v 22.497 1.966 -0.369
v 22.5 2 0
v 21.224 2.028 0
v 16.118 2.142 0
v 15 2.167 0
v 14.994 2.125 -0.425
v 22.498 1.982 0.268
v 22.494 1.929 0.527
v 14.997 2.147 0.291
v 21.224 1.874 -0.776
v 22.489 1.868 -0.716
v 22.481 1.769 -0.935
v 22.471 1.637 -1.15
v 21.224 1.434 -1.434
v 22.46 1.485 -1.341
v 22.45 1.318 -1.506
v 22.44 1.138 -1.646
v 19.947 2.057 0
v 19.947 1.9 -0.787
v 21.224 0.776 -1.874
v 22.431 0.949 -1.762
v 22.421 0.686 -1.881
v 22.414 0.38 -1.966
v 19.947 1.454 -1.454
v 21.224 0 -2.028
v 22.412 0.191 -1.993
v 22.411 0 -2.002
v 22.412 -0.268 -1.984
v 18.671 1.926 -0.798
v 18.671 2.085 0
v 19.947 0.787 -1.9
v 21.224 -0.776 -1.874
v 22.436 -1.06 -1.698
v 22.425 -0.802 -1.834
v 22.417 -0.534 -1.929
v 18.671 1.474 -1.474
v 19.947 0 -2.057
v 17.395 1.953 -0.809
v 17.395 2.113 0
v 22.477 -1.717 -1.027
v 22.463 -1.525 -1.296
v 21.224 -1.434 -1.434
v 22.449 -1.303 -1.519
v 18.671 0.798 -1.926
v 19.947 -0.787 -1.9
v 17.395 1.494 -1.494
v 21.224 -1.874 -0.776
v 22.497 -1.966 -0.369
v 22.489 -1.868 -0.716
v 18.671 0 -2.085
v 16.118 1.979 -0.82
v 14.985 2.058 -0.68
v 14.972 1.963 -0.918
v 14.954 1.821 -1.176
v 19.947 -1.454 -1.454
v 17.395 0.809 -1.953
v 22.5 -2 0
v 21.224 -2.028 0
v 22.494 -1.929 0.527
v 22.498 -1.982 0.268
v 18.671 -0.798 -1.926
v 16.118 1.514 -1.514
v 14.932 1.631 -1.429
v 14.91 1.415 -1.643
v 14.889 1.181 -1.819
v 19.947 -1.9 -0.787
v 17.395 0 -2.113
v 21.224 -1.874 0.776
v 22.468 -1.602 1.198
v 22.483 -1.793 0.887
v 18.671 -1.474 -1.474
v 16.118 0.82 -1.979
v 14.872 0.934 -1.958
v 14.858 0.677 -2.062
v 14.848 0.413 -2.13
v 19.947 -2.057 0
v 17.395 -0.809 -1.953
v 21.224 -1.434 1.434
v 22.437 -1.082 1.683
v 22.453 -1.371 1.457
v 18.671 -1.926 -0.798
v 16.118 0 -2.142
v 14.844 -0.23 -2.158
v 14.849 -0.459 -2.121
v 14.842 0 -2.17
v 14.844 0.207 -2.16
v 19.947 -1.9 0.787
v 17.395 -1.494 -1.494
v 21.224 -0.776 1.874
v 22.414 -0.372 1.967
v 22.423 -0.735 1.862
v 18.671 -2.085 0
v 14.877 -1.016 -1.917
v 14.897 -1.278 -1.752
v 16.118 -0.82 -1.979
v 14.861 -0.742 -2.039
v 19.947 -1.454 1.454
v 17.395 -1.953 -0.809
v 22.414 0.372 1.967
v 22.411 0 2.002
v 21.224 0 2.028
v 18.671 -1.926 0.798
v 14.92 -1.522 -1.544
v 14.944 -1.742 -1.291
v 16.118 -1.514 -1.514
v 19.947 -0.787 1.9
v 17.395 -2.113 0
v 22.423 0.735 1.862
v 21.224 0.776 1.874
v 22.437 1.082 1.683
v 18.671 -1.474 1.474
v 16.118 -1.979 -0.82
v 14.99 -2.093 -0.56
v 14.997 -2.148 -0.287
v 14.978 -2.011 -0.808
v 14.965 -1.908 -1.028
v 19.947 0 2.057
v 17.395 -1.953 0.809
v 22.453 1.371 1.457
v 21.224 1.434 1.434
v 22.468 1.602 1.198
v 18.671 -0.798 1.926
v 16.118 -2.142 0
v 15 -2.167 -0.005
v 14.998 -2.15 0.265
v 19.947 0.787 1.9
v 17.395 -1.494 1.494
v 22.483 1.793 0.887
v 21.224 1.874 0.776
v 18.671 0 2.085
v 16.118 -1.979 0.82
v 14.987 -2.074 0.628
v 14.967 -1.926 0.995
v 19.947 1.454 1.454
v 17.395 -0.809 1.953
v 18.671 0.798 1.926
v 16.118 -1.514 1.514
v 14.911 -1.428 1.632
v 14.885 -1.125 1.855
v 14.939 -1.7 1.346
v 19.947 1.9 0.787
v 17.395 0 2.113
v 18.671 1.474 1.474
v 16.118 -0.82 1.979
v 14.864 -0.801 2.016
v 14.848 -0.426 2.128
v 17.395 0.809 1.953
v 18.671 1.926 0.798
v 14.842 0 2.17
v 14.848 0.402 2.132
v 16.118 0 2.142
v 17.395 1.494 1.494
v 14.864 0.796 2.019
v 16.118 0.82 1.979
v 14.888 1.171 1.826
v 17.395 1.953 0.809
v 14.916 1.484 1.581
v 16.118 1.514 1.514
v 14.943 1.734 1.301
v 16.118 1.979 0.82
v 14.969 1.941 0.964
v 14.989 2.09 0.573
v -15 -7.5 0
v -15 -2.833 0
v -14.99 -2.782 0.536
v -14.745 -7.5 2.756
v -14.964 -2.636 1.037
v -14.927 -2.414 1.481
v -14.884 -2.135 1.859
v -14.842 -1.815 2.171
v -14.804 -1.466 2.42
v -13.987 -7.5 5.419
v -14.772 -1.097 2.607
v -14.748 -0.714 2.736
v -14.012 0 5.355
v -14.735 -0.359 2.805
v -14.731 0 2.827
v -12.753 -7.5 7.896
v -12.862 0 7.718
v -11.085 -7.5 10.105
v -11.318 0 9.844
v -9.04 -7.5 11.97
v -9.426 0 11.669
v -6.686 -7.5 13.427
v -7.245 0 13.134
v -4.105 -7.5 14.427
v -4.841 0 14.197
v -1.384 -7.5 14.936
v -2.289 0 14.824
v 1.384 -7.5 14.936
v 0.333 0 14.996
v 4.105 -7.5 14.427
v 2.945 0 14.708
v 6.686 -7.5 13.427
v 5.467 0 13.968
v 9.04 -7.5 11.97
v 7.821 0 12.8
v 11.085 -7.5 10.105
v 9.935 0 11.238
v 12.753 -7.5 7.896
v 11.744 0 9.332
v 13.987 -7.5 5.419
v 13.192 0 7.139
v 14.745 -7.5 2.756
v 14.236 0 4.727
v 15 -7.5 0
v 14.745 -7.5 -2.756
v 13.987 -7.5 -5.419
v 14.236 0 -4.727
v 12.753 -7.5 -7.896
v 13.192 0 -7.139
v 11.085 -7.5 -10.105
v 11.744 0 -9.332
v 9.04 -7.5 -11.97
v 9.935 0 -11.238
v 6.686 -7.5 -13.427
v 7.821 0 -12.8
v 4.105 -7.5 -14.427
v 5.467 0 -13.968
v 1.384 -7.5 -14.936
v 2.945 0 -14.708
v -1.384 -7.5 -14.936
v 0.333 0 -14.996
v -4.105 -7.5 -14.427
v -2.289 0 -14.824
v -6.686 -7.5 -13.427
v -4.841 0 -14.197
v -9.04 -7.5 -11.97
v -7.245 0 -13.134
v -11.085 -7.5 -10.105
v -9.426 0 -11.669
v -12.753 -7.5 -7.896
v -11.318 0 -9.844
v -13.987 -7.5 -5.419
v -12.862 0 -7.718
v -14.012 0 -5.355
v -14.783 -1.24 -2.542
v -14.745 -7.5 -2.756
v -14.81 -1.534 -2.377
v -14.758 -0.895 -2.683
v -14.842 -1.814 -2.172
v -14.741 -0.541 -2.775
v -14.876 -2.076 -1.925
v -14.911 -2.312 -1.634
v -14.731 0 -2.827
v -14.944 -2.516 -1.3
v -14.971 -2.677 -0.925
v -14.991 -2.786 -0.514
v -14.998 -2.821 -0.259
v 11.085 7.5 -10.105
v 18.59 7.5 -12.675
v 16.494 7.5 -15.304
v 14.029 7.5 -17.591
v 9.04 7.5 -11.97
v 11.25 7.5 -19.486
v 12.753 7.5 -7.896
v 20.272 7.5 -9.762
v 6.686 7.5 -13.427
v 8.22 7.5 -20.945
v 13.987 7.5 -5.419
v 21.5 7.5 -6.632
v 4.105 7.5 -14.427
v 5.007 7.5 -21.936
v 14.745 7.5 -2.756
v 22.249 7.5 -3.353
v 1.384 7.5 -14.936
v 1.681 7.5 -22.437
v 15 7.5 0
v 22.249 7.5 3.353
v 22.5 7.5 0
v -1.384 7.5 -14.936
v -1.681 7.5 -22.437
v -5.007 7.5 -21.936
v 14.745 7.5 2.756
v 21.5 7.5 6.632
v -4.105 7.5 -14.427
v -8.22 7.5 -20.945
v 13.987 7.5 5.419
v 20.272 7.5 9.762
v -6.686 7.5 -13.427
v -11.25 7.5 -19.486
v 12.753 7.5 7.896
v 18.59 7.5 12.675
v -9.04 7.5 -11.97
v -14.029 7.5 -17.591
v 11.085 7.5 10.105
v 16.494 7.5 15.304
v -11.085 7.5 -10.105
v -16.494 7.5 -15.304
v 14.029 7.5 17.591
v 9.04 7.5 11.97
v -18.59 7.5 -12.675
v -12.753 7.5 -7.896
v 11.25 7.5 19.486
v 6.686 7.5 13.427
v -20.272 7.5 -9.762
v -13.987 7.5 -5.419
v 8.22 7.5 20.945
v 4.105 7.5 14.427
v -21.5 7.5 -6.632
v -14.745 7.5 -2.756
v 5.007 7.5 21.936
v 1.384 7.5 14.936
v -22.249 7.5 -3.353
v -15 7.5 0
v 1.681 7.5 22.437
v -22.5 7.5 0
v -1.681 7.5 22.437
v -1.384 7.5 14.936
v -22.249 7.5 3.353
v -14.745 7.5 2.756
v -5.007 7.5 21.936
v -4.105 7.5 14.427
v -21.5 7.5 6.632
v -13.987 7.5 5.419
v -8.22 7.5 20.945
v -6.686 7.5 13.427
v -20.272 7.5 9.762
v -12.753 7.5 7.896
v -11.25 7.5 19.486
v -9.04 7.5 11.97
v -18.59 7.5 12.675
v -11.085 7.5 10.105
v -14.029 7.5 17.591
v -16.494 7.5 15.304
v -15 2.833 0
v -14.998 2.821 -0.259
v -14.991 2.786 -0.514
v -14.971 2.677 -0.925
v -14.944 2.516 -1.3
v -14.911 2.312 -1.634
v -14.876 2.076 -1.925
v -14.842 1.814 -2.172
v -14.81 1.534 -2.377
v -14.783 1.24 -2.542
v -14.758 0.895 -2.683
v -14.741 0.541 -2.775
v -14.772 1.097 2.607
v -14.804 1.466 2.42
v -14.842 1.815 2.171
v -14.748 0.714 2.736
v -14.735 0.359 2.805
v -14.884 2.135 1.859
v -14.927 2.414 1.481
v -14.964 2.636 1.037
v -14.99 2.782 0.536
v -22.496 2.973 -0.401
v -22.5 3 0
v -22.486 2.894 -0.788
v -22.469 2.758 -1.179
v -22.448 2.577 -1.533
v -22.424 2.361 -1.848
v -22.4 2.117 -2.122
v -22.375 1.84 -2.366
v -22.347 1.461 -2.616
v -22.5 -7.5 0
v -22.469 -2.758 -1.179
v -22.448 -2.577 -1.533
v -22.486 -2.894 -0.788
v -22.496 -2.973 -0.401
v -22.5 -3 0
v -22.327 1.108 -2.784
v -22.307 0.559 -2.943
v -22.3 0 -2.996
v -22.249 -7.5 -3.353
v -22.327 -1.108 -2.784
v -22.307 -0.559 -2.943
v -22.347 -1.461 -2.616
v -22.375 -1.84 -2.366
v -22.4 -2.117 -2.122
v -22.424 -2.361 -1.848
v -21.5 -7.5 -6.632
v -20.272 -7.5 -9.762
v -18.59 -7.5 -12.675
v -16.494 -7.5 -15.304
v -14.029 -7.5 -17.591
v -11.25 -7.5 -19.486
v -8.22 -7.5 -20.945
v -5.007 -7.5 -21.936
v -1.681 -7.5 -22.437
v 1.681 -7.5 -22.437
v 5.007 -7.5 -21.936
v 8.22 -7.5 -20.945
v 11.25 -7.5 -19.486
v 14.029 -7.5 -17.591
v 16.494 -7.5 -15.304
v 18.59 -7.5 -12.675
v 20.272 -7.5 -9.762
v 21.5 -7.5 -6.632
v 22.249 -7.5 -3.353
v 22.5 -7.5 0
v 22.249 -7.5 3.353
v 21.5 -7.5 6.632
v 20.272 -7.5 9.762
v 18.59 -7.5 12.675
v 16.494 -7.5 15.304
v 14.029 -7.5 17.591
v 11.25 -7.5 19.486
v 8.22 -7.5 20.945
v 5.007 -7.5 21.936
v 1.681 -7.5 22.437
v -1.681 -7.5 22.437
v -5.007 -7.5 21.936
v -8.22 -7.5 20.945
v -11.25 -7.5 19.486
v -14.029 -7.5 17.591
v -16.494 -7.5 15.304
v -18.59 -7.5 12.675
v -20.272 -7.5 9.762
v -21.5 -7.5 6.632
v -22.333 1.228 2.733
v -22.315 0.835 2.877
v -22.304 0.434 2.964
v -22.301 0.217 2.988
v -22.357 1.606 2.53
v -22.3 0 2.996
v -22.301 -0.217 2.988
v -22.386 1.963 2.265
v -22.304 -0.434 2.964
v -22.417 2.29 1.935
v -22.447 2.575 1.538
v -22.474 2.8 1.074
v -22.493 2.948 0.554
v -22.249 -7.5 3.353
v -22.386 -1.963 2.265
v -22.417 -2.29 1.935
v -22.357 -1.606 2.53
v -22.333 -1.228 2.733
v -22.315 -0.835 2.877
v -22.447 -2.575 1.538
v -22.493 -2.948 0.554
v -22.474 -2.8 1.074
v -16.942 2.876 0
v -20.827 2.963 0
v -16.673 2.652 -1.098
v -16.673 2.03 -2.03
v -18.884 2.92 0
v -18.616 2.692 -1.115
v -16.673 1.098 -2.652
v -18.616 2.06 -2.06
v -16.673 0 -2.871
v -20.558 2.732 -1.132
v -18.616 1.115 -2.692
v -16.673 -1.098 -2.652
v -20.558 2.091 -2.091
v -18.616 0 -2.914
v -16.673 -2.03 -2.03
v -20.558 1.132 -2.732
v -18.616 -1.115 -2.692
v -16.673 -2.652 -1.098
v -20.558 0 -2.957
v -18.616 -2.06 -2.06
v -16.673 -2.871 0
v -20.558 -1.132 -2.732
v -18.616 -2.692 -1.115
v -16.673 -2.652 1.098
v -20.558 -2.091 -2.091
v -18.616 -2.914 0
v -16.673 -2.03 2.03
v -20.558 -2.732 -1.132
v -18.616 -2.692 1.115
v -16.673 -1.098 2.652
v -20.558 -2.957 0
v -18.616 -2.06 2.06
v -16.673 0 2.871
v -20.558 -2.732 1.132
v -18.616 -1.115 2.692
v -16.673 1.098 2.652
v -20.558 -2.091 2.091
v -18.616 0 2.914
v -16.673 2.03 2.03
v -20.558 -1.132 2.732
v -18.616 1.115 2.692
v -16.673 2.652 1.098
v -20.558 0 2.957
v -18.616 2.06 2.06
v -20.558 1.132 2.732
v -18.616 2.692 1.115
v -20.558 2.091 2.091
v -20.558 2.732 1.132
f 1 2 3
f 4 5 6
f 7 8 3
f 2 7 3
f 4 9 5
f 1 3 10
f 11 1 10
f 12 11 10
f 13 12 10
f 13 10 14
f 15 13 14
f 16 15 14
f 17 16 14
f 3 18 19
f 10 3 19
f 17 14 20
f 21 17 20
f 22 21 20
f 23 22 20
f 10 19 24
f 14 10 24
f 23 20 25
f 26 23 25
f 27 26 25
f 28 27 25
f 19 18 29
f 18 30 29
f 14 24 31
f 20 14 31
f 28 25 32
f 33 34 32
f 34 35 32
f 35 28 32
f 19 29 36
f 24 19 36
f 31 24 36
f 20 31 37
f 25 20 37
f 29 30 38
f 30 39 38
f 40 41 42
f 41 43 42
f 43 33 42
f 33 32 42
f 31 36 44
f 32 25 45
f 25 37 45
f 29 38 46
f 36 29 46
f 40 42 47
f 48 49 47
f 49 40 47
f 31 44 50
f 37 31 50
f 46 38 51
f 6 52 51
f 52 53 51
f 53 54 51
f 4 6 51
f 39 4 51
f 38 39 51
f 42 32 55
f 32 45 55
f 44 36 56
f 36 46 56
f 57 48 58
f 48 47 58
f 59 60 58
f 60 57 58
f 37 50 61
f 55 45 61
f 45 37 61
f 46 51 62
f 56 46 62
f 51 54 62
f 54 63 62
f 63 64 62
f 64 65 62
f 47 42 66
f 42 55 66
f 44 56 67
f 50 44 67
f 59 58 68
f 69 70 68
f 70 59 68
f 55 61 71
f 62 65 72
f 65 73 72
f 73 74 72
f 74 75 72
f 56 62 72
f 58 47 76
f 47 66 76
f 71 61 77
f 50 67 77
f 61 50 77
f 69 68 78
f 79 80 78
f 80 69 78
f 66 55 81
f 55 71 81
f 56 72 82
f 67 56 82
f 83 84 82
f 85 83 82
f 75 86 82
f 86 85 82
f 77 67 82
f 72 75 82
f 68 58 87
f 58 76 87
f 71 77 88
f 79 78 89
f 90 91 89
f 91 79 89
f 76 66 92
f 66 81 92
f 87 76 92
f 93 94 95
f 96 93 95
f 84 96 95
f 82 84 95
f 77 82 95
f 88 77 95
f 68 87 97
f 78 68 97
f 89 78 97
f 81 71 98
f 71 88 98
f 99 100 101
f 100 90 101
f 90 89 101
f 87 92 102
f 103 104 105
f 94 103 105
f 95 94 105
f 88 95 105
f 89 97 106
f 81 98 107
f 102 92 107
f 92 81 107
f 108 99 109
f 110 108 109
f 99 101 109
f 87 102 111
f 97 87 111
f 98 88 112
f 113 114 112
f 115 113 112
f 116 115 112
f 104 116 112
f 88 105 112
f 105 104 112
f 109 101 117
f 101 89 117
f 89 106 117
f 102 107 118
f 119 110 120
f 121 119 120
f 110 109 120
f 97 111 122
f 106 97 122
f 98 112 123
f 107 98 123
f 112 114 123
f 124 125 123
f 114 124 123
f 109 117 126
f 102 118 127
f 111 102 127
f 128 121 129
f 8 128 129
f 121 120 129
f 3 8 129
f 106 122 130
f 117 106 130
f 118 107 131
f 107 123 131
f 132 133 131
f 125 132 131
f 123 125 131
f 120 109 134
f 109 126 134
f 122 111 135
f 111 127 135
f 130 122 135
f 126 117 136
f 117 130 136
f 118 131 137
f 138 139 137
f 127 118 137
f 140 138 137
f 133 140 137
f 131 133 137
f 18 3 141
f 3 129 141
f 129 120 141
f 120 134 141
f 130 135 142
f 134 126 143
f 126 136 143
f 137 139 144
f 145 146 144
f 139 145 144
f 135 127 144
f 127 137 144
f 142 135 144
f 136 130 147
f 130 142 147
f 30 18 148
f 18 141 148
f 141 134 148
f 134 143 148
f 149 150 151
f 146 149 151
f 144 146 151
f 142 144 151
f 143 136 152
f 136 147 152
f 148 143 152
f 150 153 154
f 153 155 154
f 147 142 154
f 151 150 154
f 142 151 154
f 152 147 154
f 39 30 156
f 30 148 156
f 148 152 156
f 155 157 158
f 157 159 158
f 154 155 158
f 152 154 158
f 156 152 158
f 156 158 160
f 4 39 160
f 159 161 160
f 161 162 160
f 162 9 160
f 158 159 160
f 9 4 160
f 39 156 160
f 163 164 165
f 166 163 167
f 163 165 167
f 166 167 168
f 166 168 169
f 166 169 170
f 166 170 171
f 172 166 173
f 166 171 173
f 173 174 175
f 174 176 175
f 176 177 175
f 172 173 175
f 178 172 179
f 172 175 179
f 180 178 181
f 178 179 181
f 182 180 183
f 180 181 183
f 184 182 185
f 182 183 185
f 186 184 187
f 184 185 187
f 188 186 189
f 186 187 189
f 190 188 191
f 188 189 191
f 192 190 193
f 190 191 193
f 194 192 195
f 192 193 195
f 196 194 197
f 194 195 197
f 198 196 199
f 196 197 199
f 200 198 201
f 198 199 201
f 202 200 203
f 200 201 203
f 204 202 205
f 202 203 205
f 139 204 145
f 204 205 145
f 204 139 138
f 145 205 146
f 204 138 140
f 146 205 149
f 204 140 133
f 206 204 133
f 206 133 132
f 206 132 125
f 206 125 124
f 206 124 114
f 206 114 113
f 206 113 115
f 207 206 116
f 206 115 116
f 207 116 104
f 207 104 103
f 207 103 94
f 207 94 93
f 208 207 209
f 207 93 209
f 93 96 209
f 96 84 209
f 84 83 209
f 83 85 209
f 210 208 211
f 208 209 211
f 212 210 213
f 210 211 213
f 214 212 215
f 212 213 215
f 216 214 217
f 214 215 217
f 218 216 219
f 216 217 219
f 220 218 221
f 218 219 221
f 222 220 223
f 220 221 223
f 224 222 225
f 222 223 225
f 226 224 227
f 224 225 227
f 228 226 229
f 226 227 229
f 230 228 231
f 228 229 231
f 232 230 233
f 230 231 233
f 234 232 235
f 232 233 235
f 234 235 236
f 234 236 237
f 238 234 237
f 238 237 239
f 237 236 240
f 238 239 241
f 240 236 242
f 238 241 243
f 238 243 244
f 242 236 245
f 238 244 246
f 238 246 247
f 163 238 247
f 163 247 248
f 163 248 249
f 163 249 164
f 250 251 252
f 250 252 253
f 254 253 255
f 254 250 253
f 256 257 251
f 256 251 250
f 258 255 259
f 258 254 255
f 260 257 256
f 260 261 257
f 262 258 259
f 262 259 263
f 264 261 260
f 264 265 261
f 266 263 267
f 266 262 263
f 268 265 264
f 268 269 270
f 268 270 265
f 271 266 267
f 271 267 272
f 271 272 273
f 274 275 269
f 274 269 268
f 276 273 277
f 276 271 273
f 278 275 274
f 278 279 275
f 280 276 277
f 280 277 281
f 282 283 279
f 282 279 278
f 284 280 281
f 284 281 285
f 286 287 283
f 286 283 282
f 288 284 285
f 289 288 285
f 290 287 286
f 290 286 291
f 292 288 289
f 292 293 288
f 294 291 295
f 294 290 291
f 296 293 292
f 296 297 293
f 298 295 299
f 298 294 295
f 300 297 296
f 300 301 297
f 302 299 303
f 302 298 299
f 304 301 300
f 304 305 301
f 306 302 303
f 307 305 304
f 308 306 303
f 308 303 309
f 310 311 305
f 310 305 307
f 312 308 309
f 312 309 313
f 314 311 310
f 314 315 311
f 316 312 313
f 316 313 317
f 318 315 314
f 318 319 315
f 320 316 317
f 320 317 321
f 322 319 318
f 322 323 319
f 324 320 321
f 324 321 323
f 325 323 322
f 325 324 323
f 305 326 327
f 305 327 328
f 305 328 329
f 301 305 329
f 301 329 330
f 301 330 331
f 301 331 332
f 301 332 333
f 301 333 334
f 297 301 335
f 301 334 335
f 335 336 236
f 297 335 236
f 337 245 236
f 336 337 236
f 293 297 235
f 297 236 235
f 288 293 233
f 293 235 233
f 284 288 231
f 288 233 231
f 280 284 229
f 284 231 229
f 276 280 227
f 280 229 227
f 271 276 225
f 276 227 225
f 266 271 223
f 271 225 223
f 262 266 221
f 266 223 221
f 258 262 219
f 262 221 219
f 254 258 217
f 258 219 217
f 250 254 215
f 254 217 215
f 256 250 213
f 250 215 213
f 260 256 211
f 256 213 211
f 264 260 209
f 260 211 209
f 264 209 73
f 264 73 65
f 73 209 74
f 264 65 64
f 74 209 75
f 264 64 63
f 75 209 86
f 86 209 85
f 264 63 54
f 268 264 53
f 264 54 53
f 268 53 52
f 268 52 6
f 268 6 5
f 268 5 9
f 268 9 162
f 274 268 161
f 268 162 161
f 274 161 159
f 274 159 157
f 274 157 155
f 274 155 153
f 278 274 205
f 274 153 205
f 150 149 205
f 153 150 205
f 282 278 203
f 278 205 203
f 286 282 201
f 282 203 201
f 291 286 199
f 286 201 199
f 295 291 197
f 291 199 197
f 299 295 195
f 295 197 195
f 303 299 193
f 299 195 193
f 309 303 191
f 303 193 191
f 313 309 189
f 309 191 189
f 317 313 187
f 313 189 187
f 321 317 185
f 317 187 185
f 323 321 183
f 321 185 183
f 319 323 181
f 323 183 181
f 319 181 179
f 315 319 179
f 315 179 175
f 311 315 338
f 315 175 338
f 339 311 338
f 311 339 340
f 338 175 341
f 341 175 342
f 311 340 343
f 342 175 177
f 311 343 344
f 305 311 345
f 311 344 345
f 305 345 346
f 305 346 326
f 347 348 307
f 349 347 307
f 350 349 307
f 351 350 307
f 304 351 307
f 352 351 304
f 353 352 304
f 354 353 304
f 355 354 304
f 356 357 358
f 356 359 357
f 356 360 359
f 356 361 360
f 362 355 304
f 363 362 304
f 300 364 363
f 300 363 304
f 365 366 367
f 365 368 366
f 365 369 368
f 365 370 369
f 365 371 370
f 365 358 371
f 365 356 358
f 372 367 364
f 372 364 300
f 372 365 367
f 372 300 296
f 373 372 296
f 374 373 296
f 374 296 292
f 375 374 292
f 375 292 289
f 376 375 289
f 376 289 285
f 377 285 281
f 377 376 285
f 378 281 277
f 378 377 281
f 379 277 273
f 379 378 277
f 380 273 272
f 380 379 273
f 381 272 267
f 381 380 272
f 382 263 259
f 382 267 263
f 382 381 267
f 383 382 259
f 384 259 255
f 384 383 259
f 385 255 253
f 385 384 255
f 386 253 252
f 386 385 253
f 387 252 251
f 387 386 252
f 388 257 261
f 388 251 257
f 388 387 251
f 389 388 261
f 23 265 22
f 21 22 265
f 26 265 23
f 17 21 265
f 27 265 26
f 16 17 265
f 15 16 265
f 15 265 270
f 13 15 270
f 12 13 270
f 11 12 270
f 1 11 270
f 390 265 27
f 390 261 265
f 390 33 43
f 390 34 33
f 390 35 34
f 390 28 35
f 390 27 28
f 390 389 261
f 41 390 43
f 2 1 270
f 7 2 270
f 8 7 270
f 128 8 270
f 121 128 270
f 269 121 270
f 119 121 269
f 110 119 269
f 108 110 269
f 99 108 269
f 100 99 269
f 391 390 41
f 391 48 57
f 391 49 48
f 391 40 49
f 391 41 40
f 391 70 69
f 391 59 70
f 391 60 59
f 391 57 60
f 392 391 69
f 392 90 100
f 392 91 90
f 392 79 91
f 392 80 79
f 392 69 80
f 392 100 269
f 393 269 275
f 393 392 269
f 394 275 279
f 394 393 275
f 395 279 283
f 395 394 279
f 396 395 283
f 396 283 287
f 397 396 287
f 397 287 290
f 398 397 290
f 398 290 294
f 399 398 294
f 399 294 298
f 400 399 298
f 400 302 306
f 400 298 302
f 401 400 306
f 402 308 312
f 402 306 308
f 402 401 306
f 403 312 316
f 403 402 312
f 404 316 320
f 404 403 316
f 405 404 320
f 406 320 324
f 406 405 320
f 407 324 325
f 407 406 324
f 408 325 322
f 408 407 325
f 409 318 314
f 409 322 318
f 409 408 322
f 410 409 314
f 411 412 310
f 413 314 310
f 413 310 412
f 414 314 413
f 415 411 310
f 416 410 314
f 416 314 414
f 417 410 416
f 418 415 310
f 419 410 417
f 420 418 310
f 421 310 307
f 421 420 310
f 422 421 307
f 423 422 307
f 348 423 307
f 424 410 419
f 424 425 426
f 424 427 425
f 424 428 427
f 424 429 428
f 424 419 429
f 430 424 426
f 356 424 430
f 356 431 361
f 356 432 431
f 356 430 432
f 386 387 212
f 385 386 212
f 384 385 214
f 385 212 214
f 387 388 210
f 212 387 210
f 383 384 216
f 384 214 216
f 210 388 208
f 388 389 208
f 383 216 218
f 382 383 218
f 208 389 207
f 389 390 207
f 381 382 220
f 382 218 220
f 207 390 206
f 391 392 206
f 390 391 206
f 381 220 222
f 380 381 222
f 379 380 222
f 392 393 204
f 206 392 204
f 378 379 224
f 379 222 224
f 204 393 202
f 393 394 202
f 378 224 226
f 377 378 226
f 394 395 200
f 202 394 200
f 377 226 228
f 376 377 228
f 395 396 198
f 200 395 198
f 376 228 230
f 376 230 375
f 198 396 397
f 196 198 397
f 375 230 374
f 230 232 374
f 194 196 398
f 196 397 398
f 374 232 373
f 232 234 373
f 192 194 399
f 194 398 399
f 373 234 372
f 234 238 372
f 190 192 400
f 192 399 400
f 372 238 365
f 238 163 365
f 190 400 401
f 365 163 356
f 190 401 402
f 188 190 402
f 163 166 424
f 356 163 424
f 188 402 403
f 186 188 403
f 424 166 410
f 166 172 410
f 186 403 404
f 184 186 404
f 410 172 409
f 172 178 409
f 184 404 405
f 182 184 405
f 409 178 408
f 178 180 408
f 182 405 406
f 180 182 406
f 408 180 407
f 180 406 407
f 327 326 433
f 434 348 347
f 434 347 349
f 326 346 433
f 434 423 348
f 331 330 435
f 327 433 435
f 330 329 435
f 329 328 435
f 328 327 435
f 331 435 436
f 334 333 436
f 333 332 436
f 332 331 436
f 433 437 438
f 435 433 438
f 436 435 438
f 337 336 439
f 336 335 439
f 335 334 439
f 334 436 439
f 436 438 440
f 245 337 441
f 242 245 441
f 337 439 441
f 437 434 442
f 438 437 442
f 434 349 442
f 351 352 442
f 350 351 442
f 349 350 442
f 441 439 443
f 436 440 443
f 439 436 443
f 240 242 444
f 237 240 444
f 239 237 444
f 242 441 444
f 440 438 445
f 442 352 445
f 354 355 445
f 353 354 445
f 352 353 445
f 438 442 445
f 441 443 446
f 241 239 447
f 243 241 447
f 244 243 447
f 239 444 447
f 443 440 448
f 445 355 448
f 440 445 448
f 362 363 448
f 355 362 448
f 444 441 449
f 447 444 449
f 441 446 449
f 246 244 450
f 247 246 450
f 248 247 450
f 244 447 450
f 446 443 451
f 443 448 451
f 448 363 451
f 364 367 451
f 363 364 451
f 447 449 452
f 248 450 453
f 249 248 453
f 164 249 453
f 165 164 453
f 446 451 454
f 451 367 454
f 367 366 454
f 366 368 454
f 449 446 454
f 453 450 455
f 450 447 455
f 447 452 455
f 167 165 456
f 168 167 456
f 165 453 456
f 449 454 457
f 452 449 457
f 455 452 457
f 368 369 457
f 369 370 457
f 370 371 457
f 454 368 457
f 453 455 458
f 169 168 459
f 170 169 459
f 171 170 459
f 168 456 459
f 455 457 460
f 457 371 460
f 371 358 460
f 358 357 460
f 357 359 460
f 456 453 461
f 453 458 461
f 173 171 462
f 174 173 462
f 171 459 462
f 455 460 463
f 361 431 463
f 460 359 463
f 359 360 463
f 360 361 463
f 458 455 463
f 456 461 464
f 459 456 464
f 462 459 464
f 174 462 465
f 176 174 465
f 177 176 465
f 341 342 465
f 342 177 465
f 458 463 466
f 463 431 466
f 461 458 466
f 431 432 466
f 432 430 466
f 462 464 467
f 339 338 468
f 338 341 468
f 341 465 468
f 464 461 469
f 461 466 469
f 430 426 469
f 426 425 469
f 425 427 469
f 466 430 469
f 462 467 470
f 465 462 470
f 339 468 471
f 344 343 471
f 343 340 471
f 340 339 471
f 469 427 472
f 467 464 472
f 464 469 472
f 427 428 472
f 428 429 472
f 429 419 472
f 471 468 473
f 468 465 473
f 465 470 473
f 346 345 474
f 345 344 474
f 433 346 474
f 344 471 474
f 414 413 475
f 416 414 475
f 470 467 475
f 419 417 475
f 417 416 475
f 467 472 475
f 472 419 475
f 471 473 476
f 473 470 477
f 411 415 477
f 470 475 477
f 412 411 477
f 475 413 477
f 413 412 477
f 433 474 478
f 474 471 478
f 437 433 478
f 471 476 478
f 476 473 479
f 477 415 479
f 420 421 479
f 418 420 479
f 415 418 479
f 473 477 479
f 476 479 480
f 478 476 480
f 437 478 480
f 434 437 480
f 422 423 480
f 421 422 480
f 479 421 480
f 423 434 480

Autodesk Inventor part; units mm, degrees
ref_plane "YZ Plane" through (0, 0, 0) normal (1, 0, 0) x (0, 1, 0)
ref_plane "XZ Plane" through (0, 0, 0) normal (0, 1, 0) x (-1, 0, 0)
ref_plane "XY Plane" through (0, 0, 0) normal (0, 0, 1) x (1, 0, 0)
sketch "Sketch1" plane through (0, 0, 0) normal (0, 1, 0) x (-1, 0, 0)
  circle A0 centre (0, 0) radius 22.5
  circle A1 centre (0, 0) radius 15
  dimension "d0" = 45
  dimension "d1" = 30
extrude "Extrusion1" add sketch "Sketch1" along normal mid plane 15
sketch "Sketch2" plane through (0, 0, 0) normal (0, 0, 1) x (1, 0, 0)
  line L0 (-22.5, -7.5) -> (-22.5, 7.5) projected
  line L1 (-22.5, 0) -> (22.5, 0)
  line L2 (22.5, -7.5) -> (22.5, 7.5) projected
  line L3 (-22.5, 0) -> (-22.5, 3)
  line L4 (22.5, 0) -> (22.5, 2)
  line L5 (22.5, 2) -> (-22.5, 3)
  point P0 (0, 0)
  dimension "d4" = 3
  dimension "d5" = 2
revolve "Revolution1" cut sketch "Sketch2" angle 360 about axis through (-22.5, 0, 0) along (1, 0, 0)
properties part number "taper pin"
